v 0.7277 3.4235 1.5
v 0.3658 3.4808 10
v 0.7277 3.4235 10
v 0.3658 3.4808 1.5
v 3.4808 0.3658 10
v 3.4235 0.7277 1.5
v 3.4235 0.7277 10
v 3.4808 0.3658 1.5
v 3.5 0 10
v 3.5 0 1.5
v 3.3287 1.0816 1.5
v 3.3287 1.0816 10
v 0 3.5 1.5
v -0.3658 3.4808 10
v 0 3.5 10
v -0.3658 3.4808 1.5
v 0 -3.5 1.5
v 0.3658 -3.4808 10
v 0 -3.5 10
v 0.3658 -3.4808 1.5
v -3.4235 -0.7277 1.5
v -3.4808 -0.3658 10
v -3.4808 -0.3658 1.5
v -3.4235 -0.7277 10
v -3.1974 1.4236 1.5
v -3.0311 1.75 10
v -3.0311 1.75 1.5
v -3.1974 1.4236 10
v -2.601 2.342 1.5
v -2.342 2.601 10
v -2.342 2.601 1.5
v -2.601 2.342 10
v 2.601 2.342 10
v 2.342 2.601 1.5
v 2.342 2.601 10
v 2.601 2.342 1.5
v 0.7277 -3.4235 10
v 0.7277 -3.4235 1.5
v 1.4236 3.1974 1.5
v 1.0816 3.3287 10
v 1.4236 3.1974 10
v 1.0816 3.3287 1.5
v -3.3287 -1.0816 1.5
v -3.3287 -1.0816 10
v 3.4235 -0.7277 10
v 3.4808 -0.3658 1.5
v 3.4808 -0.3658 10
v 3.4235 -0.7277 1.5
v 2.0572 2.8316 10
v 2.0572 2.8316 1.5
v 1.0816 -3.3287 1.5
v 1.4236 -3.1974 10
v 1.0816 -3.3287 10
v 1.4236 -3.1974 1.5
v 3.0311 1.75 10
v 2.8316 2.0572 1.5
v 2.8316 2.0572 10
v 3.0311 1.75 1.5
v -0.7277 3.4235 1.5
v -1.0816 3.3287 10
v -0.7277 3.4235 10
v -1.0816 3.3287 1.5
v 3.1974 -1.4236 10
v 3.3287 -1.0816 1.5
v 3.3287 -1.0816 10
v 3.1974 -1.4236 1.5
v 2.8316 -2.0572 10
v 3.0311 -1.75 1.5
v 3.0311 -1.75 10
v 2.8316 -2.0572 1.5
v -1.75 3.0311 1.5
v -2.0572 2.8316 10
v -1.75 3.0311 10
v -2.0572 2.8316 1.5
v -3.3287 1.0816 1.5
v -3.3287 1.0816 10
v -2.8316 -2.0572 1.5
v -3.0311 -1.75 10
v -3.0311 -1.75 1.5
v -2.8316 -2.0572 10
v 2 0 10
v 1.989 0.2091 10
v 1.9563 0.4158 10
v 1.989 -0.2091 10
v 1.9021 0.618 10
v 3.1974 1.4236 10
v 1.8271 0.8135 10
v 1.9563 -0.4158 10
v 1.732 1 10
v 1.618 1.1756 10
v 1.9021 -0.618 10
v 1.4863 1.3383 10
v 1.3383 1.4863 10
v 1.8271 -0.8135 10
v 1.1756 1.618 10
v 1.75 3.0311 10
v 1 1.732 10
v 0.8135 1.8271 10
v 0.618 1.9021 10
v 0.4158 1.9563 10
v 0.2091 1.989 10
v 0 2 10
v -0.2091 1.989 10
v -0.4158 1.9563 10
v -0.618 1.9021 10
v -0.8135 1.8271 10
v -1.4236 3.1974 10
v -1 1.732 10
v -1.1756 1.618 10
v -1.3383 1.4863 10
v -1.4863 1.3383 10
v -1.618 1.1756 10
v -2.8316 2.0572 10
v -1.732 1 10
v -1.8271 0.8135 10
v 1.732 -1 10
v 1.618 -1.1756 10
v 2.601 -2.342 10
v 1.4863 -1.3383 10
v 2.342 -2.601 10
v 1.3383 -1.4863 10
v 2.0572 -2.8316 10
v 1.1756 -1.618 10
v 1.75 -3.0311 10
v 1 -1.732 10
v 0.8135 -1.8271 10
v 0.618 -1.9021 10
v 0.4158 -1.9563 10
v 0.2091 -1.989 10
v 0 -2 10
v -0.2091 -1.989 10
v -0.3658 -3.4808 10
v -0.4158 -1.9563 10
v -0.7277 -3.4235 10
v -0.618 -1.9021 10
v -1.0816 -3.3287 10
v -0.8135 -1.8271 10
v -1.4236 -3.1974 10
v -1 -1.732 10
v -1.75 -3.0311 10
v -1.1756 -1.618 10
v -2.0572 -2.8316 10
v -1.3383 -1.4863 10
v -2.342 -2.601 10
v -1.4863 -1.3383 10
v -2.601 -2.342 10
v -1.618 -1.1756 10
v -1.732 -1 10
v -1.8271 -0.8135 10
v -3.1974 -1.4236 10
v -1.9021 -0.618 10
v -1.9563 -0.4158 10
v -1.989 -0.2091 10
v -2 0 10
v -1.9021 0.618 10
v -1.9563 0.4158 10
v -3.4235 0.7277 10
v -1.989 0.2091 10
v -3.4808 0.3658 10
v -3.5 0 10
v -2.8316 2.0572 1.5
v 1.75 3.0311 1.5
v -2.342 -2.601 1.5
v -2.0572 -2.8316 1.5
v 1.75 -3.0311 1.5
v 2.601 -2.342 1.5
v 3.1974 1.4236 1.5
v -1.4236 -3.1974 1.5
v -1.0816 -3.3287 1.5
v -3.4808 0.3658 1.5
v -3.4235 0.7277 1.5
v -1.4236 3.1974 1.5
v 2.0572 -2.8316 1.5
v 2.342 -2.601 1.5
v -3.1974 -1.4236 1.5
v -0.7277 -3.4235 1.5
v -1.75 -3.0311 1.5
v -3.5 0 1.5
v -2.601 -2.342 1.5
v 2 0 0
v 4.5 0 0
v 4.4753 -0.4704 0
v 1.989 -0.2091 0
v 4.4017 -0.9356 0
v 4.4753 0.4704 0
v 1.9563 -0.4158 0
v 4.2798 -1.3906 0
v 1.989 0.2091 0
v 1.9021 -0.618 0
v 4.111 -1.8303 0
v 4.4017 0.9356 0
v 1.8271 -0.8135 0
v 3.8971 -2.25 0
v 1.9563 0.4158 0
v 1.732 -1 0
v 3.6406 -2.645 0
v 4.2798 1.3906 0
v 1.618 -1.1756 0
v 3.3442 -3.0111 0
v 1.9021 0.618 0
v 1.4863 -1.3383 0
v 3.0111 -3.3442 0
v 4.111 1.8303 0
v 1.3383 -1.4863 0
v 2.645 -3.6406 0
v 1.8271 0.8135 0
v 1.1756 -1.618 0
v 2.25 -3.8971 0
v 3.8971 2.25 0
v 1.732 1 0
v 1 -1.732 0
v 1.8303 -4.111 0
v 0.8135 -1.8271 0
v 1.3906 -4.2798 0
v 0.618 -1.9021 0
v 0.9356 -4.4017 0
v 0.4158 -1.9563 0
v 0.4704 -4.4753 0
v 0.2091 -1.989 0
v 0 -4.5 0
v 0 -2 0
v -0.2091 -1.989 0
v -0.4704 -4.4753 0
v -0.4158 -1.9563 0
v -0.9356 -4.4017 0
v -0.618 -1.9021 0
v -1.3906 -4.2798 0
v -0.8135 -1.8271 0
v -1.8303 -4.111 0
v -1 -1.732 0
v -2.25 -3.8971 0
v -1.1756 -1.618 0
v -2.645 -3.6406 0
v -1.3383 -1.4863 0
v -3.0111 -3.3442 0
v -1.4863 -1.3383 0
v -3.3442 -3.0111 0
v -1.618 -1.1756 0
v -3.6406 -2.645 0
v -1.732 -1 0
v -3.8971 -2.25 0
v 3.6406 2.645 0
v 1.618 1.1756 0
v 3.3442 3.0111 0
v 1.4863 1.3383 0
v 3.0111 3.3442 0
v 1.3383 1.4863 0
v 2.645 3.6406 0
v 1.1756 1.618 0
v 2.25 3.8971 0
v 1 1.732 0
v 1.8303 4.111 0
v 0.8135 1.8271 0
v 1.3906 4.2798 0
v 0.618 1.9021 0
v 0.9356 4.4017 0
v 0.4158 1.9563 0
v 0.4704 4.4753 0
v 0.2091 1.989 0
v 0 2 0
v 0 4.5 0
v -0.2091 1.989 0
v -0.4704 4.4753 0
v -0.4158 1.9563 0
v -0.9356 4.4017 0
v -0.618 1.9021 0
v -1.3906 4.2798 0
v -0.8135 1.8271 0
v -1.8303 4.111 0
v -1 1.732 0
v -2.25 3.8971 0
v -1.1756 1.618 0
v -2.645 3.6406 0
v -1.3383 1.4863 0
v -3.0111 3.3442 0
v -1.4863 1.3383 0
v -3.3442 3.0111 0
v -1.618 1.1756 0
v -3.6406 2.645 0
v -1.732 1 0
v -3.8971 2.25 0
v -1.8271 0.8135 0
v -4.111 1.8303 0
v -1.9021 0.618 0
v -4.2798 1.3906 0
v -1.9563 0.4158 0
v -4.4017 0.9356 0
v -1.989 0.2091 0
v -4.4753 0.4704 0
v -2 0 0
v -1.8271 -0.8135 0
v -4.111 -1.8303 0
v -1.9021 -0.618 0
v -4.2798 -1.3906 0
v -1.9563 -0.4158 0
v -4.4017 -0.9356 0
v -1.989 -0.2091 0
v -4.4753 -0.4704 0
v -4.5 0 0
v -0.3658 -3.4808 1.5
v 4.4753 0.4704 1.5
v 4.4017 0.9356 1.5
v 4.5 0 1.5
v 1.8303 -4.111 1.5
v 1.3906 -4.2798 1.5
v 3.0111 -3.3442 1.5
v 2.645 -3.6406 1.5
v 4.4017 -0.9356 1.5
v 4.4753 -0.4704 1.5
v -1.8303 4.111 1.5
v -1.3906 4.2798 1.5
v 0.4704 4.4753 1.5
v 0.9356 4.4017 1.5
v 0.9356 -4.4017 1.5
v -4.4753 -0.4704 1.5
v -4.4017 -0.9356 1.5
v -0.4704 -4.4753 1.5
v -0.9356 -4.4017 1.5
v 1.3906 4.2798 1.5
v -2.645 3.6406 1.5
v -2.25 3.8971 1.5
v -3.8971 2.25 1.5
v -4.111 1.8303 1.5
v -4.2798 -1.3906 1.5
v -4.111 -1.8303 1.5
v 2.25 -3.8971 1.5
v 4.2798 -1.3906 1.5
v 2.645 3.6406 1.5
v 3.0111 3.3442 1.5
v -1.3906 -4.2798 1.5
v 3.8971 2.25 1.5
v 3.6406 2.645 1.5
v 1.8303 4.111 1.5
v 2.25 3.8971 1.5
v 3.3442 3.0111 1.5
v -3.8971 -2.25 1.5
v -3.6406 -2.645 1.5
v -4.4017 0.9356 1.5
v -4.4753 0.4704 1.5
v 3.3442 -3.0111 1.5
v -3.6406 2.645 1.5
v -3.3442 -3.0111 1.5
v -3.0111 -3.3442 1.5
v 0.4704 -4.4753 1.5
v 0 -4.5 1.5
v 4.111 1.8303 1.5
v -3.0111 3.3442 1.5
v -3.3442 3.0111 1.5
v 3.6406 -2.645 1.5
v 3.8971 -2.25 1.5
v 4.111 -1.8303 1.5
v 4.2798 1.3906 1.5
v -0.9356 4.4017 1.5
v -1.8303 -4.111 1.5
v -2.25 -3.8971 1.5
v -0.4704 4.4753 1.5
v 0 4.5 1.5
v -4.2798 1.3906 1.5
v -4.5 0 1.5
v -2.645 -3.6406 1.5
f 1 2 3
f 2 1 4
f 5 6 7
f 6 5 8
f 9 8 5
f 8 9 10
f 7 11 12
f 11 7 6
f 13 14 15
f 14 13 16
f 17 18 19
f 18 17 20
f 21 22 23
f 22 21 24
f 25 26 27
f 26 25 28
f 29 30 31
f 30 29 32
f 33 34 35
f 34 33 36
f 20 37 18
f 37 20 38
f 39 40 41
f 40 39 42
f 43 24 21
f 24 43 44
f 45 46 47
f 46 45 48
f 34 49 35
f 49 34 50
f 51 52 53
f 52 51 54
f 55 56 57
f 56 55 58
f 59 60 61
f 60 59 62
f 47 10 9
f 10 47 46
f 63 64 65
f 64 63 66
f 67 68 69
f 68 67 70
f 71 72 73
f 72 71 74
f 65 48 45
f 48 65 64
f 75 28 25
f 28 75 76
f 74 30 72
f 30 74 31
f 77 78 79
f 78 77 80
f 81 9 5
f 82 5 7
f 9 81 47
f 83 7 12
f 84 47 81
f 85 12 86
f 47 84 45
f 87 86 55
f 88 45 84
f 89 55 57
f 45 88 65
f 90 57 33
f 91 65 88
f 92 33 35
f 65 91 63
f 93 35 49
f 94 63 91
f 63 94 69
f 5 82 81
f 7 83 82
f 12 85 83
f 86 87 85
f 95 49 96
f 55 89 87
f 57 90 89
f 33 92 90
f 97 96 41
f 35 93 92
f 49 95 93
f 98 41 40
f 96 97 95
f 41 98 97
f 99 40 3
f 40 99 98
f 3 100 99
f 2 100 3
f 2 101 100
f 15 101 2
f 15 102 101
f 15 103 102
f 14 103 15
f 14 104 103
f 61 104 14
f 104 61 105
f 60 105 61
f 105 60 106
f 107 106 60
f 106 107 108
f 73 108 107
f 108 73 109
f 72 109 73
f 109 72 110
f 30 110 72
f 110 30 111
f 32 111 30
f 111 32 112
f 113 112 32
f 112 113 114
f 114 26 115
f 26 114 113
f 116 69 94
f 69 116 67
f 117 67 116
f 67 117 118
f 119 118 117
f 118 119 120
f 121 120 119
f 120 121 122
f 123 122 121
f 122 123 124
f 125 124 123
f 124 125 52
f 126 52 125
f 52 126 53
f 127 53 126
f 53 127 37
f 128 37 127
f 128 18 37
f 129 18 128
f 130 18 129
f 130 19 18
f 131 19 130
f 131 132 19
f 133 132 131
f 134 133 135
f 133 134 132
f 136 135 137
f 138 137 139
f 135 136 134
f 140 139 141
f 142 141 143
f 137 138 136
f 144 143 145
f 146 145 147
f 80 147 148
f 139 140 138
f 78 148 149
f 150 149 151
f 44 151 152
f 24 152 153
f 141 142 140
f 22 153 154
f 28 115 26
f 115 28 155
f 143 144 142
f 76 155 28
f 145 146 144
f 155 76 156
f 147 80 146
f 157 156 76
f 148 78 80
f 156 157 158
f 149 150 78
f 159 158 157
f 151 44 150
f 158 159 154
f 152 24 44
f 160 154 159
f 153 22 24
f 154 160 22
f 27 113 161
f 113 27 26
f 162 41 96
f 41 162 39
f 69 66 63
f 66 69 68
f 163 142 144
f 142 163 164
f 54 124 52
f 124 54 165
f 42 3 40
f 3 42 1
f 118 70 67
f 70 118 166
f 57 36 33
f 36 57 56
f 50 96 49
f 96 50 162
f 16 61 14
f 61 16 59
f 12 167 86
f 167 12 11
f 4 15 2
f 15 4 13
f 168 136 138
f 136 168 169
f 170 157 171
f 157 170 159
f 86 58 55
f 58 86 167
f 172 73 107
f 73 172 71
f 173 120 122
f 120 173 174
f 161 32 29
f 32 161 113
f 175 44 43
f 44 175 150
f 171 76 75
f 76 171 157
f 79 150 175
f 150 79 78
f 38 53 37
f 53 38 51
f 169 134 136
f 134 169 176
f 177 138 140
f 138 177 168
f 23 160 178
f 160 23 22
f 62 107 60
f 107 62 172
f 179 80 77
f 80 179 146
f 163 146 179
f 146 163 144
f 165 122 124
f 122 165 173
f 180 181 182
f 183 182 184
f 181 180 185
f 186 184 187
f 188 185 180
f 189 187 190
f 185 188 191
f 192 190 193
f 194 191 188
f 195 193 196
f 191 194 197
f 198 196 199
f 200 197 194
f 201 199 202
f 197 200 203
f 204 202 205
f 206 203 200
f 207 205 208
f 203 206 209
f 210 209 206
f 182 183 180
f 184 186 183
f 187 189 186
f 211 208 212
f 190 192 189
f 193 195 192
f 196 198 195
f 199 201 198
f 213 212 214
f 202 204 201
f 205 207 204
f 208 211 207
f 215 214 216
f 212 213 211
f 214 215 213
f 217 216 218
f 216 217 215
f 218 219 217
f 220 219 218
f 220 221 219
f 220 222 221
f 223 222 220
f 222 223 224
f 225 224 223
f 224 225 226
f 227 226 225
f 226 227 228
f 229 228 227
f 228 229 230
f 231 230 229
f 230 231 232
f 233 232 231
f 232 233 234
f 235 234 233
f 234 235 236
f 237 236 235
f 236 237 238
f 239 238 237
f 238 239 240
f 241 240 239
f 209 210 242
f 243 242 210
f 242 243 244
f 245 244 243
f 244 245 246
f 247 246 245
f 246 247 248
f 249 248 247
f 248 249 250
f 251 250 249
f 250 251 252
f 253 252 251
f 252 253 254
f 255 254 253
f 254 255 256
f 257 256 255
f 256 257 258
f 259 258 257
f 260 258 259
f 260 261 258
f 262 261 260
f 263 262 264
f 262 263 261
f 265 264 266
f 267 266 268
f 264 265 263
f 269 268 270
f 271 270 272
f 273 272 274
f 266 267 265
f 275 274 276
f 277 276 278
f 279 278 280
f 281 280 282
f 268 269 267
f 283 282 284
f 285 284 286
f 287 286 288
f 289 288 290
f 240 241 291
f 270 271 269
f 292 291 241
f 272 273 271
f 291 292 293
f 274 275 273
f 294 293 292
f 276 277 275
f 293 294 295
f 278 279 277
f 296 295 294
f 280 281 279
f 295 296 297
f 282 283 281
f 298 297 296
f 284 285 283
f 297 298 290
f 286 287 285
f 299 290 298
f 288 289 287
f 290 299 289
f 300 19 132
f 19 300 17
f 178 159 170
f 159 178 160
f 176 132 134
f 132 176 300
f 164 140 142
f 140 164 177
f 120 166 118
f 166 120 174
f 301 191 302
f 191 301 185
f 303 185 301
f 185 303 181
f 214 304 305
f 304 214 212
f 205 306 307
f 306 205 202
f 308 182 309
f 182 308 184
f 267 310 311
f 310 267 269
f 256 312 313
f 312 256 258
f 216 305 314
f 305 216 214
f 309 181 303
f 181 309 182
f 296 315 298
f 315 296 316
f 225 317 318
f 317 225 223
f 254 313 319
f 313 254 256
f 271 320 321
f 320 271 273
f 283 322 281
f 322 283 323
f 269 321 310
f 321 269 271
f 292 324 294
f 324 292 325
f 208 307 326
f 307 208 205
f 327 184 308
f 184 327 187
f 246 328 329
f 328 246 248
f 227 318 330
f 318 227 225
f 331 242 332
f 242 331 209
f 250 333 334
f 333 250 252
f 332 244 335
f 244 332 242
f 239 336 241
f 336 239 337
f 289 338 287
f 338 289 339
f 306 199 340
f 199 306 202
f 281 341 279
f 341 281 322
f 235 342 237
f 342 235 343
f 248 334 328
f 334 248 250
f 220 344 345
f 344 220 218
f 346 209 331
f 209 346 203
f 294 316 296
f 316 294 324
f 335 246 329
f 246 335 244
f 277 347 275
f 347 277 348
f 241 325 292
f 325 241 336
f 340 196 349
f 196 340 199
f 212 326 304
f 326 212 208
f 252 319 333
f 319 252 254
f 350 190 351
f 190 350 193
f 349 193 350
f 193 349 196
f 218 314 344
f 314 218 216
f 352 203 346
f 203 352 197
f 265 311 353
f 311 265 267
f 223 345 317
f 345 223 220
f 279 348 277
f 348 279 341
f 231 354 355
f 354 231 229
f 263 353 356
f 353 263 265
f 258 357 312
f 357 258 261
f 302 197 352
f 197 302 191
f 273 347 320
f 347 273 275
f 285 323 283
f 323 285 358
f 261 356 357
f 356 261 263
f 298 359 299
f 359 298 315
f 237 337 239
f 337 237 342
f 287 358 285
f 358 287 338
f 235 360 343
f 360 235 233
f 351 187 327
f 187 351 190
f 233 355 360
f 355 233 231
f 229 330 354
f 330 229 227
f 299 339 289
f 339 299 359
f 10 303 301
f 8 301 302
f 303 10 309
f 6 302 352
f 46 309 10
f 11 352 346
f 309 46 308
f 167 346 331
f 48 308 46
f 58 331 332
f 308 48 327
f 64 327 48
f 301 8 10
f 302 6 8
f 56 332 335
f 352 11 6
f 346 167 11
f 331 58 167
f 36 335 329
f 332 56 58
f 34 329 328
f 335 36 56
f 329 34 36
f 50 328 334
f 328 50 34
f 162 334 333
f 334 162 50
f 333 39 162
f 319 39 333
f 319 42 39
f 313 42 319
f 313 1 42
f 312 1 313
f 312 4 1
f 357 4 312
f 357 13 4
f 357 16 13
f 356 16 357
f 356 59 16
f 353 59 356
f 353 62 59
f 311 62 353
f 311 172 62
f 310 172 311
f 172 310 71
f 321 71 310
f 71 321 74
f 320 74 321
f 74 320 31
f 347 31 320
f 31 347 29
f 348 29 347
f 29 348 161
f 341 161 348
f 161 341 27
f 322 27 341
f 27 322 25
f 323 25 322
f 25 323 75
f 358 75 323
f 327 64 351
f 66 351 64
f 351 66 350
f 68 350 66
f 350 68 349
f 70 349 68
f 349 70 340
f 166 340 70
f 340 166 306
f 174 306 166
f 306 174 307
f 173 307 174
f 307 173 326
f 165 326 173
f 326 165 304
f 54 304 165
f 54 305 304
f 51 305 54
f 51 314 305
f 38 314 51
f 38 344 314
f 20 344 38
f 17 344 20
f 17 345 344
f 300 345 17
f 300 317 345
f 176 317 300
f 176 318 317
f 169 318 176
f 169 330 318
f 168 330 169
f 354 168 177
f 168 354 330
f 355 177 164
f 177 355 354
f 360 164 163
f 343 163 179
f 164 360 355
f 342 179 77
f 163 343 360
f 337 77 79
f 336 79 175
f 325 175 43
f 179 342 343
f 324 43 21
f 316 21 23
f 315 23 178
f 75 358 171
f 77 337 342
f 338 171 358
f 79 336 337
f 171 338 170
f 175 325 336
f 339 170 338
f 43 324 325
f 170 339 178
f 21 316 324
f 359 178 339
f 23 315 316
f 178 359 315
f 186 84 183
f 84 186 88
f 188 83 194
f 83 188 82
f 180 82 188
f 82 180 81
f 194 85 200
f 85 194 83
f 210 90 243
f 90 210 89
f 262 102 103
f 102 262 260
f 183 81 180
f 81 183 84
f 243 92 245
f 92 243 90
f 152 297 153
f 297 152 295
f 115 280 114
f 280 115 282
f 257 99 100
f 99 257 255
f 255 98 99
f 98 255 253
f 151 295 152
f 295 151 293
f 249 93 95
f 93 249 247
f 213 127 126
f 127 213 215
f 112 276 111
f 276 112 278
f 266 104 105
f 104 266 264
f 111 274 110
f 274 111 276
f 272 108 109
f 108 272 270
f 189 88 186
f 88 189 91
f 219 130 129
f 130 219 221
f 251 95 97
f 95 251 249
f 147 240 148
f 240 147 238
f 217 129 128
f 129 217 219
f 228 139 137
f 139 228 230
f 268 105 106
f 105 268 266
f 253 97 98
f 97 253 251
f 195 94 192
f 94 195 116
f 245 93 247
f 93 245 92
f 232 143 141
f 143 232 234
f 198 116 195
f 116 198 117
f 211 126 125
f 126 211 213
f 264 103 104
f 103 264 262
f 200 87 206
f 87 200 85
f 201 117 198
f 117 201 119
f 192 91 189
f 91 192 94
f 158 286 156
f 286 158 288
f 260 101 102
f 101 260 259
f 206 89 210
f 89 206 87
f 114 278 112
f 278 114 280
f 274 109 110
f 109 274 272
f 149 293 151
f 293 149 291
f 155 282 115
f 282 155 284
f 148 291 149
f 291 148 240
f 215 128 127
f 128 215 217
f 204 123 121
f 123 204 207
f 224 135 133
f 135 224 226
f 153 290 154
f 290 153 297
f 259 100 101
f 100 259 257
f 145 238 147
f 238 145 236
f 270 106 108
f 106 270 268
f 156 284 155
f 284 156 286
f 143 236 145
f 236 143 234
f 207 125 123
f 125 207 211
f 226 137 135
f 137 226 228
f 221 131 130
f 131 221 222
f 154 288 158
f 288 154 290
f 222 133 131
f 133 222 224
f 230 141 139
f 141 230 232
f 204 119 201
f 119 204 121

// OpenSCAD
// Blind-rivet body.
$fn = 60;
eps = 0.02;
shank_d = 4;
head_d = 8;
length = 10;
difference() { union() { cylinder(d=shank_d+3,h=length); cylinder(d=max(head_d, shank_d+5),h=1.5); } translate([0,0,-eps]) cylinder(d=shank_d,h=length+2*eps); }
